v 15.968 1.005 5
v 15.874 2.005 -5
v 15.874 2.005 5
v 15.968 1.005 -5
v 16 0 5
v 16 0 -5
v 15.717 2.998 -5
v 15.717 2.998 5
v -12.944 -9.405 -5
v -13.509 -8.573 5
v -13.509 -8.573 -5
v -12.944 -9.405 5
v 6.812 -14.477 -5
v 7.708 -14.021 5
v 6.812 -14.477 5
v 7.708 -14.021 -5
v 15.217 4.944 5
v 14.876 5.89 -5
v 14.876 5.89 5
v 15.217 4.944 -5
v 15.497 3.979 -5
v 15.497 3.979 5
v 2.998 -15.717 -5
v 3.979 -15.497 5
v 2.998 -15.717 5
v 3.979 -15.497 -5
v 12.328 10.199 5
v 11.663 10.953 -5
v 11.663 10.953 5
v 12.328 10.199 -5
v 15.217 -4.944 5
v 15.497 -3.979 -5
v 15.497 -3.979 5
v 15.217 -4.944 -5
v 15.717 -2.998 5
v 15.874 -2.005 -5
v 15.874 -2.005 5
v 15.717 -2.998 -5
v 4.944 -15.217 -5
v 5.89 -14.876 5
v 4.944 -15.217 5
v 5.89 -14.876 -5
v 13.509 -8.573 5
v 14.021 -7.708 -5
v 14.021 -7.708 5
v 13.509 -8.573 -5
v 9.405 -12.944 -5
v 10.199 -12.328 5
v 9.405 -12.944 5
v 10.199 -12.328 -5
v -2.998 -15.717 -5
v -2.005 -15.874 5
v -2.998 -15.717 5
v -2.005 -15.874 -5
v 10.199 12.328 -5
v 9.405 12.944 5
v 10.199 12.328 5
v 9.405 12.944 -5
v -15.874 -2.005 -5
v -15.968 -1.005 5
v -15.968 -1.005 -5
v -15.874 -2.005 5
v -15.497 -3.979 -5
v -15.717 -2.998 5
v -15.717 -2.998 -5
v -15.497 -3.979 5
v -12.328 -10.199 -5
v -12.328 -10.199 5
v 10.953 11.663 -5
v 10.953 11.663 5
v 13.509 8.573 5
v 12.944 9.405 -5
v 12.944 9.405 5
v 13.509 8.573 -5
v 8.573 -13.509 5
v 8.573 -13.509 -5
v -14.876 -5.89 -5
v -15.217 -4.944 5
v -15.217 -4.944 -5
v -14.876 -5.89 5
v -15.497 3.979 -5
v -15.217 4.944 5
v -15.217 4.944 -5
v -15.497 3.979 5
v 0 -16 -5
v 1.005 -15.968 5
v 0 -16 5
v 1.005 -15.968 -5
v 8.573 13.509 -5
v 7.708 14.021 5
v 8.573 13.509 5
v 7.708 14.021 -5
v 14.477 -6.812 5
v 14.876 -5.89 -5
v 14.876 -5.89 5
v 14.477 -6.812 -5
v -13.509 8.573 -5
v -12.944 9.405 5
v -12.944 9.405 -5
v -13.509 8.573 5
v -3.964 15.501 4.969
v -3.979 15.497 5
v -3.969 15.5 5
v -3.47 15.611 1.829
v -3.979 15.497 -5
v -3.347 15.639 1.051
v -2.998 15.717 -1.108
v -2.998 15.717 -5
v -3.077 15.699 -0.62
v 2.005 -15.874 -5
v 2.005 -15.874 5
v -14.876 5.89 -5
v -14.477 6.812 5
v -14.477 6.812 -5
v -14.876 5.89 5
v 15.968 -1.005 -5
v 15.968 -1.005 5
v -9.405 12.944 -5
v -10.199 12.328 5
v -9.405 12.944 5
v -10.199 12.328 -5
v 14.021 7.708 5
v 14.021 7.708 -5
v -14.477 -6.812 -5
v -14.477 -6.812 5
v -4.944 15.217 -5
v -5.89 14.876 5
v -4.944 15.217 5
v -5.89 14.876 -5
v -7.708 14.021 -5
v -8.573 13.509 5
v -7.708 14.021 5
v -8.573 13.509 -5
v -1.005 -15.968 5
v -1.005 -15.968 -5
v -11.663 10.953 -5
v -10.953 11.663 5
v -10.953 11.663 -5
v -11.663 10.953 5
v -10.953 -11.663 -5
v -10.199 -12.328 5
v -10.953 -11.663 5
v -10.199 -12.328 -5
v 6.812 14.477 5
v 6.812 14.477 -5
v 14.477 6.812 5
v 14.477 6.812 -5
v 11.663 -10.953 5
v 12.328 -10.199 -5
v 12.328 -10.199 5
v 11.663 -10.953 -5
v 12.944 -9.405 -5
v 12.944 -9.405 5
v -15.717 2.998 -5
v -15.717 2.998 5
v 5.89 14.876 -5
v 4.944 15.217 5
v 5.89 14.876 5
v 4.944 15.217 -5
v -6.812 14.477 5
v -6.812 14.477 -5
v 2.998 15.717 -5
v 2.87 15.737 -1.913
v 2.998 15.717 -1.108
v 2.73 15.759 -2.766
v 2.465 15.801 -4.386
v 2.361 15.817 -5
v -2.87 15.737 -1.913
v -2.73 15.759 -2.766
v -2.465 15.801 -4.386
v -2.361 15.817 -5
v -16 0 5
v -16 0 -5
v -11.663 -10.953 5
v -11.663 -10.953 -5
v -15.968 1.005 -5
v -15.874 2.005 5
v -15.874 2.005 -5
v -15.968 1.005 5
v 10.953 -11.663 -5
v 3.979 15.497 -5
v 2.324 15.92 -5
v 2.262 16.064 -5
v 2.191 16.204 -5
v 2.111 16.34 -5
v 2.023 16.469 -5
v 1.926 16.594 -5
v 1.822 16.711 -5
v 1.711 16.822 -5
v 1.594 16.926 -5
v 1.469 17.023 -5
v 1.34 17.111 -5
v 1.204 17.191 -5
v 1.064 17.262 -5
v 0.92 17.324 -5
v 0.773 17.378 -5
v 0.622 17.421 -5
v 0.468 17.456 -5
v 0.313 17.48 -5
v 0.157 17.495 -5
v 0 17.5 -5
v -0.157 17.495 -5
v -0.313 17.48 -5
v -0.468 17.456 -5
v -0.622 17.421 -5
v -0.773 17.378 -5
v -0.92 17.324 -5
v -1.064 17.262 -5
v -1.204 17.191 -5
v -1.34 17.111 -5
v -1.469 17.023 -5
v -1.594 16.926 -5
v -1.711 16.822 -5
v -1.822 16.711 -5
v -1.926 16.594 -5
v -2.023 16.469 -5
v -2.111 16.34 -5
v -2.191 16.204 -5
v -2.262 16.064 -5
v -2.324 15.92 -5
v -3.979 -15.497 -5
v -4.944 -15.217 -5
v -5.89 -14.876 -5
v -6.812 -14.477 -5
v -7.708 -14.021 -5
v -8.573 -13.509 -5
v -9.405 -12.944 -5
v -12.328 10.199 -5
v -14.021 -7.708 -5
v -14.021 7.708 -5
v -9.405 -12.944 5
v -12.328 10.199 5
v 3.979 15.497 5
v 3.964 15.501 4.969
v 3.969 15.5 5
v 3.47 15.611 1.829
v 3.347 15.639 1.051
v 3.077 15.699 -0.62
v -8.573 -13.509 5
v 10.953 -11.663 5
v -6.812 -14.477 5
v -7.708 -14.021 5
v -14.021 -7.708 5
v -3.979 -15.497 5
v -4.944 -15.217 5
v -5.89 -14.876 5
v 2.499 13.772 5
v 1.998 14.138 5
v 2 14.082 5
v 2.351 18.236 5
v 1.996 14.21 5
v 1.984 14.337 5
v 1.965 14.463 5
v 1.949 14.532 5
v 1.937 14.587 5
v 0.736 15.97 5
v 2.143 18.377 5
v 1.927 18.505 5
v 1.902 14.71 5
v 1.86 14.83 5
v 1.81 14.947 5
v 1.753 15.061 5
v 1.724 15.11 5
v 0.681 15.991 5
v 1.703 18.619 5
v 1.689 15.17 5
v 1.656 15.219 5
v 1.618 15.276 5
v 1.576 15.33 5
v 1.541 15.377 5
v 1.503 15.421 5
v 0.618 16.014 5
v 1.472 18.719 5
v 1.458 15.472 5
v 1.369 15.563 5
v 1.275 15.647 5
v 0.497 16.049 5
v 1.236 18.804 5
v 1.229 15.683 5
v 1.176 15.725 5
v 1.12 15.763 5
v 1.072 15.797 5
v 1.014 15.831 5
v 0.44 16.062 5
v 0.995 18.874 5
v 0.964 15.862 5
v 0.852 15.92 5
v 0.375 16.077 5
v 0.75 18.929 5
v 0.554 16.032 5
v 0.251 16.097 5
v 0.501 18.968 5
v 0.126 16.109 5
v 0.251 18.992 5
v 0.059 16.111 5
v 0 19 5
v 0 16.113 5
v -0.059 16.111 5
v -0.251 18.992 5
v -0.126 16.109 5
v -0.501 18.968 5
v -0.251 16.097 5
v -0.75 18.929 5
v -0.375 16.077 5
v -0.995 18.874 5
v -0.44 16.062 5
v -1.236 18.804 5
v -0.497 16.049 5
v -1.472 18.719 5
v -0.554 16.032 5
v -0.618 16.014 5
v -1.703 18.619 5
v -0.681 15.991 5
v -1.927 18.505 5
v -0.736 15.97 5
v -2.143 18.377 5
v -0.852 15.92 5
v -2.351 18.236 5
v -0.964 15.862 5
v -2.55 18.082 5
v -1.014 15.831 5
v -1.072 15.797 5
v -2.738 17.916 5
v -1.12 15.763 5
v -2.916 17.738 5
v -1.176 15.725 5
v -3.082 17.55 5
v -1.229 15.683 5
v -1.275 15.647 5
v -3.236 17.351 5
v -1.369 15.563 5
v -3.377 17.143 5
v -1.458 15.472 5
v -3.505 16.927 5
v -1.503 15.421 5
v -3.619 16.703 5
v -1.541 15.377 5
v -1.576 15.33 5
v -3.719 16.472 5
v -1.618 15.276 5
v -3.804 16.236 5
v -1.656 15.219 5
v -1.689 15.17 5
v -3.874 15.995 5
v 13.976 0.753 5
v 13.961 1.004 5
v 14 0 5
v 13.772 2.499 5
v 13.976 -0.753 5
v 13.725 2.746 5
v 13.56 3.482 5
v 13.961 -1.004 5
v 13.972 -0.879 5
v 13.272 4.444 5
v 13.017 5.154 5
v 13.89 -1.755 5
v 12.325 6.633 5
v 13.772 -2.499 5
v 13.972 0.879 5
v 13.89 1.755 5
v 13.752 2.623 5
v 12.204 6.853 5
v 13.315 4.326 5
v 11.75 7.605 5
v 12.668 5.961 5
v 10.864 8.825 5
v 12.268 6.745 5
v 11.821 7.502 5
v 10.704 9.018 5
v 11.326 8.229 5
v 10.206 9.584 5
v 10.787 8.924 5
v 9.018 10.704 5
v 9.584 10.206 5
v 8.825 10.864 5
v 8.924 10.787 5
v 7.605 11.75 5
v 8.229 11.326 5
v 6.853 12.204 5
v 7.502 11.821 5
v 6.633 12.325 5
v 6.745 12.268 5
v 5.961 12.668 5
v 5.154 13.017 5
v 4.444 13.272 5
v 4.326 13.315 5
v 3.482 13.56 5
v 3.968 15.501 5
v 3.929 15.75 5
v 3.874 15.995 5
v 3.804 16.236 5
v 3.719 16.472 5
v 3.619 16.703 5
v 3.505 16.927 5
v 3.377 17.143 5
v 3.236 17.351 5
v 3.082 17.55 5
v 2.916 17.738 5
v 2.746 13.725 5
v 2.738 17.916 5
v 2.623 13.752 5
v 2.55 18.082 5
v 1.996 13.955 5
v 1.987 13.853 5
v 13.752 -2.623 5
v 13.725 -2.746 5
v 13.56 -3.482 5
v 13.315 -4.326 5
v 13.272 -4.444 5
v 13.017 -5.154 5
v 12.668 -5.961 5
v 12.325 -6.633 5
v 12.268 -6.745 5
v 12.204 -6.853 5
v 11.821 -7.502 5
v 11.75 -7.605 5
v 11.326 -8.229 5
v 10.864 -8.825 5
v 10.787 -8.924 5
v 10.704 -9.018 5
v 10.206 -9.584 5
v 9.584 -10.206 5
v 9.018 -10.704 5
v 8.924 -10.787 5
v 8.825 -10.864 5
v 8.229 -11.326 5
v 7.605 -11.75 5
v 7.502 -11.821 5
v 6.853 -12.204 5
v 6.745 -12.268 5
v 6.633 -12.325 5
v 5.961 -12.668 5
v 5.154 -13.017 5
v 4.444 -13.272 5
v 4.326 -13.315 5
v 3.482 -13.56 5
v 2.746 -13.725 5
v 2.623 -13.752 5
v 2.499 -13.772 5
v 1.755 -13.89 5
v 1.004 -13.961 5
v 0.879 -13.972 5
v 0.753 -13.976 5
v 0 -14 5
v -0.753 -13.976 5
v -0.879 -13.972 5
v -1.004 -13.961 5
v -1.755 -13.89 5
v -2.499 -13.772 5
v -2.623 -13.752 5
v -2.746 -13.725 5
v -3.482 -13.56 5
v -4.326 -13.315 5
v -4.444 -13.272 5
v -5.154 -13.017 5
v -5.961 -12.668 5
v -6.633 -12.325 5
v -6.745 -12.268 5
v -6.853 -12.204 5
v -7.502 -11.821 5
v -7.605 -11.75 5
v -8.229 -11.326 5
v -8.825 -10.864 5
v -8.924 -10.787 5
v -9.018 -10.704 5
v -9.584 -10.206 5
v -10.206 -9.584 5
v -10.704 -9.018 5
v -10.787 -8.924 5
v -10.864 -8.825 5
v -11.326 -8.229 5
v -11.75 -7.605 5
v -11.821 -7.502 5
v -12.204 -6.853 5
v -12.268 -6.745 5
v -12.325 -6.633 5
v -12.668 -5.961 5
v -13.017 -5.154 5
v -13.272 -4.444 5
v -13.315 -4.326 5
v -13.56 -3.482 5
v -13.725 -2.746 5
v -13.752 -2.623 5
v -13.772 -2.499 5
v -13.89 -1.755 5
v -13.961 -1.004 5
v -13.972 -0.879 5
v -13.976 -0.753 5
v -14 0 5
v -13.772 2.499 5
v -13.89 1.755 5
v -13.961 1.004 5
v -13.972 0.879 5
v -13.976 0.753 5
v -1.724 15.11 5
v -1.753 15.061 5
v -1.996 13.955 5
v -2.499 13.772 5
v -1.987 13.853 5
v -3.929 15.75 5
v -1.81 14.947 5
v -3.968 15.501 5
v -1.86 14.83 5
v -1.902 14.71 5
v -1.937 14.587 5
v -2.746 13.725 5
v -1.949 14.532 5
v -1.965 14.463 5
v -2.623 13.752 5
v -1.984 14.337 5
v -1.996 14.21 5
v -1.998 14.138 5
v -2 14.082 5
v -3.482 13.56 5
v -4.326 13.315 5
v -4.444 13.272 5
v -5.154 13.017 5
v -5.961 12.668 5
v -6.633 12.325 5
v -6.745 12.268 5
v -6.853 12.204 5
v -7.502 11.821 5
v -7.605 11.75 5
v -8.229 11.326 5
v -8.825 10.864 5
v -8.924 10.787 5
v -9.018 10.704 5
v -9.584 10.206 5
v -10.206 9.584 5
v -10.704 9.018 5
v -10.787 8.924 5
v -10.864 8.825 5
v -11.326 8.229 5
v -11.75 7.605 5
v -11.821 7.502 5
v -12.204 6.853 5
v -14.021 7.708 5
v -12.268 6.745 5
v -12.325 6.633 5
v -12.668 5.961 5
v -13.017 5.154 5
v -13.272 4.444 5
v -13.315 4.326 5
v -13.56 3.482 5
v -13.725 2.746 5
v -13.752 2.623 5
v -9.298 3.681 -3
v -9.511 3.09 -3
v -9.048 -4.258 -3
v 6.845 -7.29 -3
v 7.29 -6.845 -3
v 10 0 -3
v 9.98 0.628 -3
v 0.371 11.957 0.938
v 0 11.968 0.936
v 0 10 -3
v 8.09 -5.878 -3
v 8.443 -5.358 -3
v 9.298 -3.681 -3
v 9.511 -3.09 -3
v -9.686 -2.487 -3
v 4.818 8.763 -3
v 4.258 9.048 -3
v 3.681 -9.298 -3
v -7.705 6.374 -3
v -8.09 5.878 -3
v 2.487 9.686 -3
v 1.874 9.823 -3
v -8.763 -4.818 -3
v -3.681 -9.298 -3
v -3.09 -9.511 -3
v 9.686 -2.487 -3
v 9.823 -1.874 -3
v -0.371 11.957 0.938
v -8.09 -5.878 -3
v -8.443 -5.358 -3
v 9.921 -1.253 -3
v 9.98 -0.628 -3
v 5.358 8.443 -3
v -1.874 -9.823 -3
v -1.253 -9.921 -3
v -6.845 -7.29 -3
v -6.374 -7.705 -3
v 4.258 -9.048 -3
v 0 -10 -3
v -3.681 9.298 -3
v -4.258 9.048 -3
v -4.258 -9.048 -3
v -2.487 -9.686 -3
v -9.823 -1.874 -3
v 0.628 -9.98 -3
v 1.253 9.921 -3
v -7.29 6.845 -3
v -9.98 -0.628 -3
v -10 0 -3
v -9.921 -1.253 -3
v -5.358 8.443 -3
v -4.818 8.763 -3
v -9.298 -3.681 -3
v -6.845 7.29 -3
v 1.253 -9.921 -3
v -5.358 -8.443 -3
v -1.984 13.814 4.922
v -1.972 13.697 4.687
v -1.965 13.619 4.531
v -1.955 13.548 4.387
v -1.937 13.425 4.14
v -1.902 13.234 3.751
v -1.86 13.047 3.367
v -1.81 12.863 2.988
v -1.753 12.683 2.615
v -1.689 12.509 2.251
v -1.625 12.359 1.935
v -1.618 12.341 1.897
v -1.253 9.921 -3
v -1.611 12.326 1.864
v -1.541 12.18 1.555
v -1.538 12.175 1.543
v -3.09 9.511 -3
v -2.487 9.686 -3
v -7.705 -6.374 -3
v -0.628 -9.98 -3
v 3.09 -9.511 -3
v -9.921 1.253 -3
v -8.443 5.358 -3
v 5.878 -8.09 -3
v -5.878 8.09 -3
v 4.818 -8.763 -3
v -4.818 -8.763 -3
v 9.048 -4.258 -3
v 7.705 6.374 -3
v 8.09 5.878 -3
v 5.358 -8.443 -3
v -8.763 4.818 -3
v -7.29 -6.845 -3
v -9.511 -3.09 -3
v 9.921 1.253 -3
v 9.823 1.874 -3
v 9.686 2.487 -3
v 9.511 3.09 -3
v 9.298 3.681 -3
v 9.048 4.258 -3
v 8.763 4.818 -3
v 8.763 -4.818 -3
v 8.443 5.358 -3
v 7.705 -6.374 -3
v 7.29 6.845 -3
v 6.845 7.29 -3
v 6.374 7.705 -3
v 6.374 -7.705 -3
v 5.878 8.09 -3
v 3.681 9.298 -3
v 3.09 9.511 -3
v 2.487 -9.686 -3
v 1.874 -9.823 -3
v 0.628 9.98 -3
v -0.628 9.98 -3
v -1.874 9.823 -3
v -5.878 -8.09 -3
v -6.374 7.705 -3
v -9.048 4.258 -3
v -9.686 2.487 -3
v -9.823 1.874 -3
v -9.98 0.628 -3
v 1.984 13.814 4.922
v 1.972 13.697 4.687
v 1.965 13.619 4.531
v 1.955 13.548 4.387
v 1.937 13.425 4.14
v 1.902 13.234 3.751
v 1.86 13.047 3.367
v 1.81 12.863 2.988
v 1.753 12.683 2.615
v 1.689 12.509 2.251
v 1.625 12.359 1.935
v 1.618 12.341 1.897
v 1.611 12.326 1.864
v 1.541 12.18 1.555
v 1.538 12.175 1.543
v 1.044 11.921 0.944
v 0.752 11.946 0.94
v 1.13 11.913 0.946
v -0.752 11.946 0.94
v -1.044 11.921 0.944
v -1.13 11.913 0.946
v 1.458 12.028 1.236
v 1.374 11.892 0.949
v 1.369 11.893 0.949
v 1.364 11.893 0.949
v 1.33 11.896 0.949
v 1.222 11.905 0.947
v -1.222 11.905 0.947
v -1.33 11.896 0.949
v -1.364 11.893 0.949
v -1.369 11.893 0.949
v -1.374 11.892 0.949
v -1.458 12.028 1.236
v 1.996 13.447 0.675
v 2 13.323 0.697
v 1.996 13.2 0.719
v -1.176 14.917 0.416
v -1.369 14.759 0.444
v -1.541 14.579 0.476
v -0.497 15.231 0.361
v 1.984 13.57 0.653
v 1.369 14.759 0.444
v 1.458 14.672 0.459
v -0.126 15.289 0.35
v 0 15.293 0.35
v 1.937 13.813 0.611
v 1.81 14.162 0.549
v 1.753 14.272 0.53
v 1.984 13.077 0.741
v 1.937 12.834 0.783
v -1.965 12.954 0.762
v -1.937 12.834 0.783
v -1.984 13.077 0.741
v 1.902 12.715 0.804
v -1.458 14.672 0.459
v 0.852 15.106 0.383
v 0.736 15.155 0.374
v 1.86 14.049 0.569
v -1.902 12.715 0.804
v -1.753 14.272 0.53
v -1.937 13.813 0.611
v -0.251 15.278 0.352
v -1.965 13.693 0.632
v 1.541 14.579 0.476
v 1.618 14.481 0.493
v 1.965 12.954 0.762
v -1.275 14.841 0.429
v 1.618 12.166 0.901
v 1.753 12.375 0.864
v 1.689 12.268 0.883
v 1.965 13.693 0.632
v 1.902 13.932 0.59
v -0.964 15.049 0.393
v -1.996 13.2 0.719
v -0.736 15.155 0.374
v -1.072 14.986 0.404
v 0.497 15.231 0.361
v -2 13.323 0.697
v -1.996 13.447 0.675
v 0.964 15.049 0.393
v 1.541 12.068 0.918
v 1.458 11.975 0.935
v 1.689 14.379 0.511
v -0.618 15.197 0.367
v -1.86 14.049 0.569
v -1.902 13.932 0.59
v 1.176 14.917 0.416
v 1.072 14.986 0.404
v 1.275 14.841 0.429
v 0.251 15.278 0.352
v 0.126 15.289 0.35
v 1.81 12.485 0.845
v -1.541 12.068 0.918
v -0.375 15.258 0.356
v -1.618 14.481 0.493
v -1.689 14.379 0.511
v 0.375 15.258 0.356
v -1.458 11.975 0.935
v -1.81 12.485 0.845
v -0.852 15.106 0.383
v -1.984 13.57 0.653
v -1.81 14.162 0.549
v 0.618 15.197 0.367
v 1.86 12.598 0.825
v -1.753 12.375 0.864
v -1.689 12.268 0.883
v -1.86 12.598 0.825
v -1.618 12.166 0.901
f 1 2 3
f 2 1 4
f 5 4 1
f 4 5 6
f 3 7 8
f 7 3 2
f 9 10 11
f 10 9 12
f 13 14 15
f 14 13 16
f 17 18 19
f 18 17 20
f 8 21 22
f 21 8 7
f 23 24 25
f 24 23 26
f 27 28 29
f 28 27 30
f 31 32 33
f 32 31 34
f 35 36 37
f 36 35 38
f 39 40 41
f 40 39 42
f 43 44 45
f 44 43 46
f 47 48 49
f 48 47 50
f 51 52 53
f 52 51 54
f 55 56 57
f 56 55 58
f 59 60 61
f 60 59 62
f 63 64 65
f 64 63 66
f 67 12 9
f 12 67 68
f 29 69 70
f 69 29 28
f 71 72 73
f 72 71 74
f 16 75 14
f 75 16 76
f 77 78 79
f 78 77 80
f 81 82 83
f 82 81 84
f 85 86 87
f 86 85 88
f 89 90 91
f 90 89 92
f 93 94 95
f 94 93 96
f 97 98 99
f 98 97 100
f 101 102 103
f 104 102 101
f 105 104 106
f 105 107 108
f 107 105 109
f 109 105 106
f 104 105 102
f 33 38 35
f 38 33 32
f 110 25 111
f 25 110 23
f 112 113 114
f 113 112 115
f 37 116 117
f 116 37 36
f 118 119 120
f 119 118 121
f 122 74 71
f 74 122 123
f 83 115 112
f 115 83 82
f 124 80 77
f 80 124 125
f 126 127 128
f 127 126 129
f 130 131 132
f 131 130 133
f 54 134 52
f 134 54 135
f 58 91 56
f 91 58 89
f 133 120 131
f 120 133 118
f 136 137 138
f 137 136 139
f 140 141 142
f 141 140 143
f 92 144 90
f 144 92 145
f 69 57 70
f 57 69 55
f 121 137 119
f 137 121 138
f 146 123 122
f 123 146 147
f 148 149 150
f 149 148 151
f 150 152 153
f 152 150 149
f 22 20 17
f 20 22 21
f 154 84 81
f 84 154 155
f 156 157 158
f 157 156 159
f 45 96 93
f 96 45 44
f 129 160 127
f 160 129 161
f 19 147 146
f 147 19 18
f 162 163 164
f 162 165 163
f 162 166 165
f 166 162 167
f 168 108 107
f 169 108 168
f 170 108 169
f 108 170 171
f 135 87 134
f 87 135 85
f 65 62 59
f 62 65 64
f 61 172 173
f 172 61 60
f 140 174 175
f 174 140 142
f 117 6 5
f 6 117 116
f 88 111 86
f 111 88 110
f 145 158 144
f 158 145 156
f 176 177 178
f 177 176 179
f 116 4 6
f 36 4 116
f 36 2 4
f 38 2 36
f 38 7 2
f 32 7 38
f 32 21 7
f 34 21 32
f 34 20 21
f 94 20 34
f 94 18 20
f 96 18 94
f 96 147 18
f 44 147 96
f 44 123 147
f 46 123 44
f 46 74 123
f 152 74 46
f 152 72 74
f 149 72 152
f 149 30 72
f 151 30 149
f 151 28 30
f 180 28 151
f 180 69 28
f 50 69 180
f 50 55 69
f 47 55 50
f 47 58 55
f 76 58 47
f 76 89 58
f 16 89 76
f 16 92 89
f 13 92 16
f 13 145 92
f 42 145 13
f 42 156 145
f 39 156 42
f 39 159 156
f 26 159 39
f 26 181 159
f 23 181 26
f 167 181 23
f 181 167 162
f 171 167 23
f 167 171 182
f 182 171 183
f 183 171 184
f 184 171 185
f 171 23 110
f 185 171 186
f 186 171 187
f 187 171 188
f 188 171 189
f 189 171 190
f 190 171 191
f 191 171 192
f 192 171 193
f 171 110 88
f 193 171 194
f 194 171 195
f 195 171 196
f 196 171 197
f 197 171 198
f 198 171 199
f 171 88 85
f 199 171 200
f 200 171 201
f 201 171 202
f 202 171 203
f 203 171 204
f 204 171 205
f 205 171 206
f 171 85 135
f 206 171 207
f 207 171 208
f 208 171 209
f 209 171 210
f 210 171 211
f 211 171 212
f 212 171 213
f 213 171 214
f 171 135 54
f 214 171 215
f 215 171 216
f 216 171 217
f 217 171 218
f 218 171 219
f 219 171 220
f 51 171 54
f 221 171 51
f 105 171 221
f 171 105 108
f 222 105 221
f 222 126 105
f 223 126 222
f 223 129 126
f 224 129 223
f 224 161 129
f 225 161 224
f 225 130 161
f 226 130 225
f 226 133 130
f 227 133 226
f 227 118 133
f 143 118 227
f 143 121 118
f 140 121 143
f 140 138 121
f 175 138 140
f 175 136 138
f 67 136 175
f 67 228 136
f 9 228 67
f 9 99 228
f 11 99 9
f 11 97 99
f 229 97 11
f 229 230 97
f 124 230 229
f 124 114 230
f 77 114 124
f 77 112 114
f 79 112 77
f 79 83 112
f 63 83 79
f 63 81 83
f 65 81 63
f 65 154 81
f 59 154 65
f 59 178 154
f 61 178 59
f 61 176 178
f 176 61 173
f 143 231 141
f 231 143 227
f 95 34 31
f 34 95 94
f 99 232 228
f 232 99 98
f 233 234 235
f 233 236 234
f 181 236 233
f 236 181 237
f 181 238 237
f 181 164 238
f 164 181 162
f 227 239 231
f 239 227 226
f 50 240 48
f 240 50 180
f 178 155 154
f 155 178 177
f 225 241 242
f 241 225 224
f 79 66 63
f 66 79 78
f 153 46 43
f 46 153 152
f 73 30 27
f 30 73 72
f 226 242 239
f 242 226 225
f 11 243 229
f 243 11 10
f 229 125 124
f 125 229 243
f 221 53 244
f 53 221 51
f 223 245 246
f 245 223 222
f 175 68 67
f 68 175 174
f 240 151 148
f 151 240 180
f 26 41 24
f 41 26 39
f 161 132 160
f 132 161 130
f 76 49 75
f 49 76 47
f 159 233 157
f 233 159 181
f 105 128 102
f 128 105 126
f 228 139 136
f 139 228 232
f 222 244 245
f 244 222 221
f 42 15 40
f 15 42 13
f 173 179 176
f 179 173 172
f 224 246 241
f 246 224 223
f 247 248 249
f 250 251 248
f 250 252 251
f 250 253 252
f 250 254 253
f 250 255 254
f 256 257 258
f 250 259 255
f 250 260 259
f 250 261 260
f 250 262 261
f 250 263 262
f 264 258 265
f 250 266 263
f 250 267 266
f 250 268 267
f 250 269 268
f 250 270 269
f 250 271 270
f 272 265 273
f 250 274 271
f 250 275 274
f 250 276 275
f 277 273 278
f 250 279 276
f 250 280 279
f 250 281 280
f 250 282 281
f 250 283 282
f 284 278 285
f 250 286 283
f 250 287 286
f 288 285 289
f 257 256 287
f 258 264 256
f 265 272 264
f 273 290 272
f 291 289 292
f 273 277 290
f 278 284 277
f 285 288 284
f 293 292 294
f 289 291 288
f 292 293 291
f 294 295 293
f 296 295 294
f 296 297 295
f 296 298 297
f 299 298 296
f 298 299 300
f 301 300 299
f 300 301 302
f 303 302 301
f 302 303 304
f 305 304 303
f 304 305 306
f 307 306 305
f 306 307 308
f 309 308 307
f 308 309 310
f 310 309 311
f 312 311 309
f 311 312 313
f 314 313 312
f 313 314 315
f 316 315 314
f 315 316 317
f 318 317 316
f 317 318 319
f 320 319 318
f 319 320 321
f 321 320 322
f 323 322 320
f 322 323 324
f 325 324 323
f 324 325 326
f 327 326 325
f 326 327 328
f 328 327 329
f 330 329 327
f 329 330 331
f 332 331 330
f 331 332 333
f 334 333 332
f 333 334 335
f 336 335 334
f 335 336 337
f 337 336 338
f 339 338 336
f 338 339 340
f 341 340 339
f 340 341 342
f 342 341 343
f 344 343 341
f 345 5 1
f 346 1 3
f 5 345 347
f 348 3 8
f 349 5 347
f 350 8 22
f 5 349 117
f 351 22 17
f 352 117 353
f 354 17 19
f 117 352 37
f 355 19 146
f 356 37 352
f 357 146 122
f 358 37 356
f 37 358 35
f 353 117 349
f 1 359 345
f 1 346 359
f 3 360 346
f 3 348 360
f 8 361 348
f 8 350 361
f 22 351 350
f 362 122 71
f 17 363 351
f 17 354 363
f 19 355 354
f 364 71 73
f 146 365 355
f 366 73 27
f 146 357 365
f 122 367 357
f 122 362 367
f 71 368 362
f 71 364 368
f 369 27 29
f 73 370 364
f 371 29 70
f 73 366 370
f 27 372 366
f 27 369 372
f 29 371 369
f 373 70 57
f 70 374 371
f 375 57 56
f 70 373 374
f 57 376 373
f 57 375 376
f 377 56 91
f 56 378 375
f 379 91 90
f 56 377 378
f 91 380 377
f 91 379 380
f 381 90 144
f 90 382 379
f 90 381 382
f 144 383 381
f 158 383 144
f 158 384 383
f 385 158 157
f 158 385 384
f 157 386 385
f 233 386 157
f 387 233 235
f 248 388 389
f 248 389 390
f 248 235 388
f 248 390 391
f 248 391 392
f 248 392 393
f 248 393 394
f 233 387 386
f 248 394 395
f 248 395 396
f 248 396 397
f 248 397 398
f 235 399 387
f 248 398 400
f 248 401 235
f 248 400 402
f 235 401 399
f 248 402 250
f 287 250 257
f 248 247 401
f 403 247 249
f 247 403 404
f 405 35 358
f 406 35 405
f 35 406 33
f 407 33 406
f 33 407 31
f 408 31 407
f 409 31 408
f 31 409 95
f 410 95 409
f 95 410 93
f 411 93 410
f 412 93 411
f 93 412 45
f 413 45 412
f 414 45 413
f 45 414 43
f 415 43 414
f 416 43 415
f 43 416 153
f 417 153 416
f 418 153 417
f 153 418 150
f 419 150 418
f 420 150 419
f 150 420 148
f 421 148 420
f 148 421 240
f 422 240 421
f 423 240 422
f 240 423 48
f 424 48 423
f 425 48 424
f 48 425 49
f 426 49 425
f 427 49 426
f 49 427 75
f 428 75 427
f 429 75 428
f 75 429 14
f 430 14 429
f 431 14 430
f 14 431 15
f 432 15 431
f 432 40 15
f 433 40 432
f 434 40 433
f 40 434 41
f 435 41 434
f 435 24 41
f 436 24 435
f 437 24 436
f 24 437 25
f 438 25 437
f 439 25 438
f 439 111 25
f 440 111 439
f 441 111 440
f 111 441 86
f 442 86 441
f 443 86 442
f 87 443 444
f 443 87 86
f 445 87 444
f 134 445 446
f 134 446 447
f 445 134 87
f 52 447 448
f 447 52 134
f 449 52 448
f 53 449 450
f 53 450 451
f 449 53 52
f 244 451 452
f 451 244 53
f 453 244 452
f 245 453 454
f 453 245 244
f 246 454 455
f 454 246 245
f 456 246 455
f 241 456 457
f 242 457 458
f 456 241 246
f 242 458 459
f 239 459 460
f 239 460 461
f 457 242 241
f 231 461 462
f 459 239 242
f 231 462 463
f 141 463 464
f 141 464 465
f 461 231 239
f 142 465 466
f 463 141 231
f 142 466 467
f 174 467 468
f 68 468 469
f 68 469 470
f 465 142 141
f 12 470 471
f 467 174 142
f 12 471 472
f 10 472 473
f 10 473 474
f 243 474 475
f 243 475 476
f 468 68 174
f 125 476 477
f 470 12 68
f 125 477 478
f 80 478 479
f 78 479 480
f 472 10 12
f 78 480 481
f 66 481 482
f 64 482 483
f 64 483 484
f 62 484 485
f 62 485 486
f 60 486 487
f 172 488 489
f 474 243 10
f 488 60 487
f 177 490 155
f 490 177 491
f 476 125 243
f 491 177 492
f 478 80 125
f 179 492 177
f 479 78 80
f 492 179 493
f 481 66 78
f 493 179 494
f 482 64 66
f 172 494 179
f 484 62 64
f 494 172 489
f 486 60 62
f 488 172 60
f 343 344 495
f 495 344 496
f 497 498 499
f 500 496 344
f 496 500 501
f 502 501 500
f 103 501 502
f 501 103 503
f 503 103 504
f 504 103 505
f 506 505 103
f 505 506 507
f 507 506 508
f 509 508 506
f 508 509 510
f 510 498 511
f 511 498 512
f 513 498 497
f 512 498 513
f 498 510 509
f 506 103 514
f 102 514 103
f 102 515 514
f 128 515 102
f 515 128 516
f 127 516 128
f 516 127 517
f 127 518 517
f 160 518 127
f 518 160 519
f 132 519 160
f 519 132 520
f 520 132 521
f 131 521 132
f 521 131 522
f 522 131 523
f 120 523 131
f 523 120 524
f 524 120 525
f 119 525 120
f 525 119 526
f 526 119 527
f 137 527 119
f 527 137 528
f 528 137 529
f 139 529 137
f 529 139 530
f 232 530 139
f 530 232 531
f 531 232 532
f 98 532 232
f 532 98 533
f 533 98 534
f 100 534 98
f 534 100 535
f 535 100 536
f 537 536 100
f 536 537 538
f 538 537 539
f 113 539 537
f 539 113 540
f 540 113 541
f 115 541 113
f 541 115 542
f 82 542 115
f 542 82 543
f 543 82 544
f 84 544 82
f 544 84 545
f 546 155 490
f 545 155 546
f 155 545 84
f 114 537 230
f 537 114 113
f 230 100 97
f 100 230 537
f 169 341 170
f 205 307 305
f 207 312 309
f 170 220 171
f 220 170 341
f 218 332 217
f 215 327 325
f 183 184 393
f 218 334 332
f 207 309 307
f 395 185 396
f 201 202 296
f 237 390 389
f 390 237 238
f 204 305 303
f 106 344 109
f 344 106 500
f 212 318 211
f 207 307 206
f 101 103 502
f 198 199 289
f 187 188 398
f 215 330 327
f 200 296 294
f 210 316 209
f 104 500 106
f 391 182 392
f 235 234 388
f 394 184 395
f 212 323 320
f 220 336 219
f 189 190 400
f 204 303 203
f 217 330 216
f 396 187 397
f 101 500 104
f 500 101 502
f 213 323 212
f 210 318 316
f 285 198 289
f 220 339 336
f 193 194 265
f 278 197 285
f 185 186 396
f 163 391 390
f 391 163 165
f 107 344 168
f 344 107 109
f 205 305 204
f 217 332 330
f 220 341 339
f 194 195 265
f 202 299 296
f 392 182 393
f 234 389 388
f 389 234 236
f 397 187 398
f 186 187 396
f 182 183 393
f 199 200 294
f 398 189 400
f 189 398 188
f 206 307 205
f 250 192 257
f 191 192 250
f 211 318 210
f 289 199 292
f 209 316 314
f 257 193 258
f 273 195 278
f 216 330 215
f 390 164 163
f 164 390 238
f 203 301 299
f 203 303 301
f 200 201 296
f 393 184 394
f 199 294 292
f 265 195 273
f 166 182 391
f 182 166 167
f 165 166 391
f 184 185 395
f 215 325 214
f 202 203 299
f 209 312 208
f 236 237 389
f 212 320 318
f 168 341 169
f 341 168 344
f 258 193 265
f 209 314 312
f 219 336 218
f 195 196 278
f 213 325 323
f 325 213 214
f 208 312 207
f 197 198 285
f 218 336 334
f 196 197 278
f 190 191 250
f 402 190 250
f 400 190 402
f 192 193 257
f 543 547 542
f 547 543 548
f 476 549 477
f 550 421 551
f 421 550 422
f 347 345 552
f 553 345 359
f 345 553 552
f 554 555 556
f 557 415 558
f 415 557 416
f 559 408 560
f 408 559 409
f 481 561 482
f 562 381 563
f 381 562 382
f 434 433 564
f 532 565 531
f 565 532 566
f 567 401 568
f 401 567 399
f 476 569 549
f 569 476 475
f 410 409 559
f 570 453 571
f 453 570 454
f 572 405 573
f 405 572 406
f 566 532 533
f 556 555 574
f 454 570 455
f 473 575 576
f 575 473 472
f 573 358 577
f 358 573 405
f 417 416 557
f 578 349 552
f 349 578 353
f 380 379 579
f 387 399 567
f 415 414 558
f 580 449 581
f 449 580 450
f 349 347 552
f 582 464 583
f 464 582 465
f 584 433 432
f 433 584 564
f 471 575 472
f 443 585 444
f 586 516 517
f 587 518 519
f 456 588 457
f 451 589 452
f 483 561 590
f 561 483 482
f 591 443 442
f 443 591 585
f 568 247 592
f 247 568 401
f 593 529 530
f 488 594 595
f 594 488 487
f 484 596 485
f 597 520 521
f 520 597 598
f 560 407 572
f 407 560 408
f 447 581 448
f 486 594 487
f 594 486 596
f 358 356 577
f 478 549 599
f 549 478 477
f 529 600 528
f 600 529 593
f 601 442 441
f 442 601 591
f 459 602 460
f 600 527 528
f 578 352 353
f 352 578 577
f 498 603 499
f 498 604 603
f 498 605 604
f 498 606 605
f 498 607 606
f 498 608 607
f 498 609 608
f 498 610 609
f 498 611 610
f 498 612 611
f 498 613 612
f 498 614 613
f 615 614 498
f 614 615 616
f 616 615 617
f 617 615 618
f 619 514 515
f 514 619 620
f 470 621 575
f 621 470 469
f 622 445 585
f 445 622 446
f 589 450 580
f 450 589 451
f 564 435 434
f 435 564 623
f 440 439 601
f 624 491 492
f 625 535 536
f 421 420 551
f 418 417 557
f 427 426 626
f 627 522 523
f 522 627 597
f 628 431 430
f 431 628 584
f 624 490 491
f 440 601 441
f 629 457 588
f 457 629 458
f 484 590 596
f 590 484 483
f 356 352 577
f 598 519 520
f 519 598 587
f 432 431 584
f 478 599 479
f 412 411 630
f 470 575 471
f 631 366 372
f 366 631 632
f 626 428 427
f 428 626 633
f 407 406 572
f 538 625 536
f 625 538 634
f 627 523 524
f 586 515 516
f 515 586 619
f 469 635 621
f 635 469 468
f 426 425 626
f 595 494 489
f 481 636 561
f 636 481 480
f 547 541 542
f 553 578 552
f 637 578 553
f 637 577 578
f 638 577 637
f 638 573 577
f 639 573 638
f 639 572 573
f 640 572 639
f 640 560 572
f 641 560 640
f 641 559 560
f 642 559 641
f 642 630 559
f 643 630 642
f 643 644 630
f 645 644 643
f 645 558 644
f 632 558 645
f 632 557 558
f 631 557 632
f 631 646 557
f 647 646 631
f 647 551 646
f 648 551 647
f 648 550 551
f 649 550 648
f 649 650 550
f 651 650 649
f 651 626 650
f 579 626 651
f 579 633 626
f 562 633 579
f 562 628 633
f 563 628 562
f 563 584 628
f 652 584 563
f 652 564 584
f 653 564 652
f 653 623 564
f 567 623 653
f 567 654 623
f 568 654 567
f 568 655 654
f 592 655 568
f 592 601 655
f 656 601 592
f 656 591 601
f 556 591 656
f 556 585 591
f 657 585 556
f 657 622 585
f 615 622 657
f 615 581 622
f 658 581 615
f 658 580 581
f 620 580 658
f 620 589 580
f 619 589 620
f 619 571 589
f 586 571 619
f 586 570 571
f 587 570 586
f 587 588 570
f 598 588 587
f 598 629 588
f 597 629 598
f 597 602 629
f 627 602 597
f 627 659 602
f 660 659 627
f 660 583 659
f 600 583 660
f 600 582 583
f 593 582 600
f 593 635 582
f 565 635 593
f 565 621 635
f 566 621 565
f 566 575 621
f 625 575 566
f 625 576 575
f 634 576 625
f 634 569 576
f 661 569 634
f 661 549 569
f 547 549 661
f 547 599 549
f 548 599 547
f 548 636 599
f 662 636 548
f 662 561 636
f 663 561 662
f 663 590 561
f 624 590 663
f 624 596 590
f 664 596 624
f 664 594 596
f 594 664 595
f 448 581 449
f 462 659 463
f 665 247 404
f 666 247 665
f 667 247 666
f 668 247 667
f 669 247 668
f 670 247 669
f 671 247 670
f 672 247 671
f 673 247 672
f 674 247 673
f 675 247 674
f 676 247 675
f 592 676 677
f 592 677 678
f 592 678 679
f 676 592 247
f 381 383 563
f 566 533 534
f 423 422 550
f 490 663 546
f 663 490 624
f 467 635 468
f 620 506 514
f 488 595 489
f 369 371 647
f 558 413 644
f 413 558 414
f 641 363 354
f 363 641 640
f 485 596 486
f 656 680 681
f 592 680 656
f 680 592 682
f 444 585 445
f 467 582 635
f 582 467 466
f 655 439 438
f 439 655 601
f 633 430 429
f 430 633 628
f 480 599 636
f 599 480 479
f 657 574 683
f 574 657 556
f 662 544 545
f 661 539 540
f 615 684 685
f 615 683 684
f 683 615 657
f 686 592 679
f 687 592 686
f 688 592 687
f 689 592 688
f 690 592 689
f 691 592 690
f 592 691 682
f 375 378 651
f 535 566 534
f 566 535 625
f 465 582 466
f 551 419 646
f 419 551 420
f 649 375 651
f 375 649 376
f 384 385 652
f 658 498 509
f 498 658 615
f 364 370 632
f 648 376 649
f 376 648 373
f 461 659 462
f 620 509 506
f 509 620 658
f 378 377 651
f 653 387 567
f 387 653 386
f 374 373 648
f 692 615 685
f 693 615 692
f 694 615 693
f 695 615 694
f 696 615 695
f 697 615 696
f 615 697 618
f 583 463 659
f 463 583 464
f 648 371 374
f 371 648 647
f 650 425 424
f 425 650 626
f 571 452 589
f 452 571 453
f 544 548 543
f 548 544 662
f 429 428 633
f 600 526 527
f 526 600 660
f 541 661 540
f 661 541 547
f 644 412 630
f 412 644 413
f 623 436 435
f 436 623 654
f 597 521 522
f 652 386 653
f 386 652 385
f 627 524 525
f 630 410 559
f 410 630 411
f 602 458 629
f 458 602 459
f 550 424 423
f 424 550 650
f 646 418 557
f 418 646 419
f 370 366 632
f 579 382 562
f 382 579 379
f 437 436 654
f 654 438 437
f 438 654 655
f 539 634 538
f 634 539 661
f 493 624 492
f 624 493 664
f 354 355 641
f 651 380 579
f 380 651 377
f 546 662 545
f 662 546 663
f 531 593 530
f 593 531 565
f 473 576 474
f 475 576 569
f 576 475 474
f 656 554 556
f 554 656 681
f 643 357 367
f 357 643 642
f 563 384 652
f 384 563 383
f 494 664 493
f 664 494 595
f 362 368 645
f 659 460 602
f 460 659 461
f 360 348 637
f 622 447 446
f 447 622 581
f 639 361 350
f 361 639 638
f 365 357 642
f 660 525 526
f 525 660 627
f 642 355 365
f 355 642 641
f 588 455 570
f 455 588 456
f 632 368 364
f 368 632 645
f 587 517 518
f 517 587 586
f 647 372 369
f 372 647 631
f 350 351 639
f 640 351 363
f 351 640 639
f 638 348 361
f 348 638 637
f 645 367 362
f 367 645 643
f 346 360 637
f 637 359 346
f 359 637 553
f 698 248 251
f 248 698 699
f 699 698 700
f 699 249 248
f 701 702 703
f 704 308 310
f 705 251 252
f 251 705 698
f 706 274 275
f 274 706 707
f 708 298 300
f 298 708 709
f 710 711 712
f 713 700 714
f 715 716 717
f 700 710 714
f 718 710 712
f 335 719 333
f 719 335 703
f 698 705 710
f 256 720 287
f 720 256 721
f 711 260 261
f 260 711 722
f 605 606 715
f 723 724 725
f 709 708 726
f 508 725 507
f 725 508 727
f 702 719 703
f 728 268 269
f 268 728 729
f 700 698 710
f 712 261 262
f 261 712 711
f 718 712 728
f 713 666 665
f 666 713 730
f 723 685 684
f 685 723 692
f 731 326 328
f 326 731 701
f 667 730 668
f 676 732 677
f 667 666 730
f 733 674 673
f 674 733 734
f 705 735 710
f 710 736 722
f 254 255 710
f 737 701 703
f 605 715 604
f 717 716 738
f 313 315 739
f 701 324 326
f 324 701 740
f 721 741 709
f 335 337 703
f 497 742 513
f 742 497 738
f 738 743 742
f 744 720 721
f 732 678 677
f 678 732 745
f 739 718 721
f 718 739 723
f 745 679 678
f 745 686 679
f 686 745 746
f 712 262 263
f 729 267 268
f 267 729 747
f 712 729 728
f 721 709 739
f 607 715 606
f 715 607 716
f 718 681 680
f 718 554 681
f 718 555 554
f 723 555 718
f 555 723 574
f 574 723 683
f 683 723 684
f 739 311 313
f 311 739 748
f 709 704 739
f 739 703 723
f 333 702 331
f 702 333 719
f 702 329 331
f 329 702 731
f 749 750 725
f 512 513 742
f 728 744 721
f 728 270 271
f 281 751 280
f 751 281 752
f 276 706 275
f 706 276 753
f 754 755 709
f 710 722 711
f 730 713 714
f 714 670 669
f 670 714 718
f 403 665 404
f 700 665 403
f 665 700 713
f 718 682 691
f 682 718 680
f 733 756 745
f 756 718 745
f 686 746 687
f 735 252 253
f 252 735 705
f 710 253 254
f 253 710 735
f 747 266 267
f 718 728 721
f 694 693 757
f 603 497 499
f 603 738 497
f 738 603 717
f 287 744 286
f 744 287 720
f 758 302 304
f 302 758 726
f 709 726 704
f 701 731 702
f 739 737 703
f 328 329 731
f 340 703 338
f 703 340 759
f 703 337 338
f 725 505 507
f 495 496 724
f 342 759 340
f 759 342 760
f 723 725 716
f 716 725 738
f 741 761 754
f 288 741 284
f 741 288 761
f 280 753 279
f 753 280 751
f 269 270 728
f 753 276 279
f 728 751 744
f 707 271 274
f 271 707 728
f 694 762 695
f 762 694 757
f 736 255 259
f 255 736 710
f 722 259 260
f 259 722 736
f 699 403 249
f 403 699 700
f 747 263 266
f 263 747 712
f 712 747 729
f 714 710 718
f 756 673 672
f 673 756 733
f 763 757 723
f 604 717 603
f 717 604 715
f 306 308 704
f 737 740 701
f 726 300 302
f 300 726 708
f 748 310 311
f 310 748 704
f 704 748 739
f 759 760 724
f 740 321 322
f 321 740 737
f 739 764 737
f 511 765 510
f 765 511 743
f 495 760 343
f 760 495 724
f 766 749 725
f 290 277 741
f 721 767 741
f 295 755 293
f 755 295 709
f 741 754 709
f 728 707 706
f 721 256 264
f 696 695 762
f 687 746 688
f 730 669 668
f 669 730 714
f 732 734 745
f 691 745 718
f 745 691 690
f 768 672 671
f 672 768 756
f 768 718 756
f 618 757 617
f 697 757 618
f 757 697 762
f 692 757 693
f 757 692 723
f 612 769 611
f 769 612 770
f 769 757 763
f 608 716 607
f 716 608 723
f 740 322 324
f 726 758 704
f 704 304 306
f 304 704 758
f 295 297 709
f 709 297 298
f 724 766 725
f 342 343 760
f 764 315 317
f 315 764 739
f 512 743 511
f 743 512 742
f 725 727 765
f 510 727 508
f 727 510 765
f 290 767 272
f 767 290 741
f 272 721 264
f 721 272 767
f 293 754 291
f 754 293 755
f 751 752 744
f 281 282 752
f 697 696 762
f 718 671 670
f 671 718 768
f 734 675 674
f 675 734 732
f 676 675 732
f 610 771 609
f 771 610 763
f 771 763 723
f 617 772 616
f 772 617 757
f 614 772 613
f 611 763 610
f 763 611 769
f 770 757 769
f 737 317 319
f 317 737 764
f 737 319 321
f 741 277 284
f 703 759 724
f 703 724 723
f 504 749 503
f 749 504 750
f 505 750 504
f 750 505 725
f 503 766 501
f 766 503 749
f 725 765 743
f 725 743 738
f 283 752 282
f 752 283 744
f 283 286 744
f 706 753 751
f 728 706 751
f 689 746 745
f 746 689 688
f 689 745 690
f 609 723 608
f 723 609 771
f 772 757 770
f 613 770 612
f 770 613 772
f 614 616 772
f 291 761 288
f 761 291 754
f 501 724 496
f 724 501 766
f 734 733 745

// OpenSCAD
thick  = 2;
height = 10;

radiusDown = 20.0 /2;
radiusUp   = 30.0 / 2; 

jetDown = 5.0 /2;
jetUp = 8.0 /2;

$fn = 100;

module tray()
{
    difference()
    {
        difference()
        { 
         union()
         {   
          cylinder(h= height, r=radiusUp + (thick/2), center=true);
          translate([0, radiusUp, 0]) cylinder(h= height, r1= jetDown, r2 = jetUp, center=true);   
         }     
         translate([0,0, thick]) #cylinder(h=height, r1=radiusDown, r2=radiusUp, center=true);
         
         // Jet
         rotate([-10, 0, 0])
         translate([0, radiusUp - thick, height - thick]) 
          #cylinder(h= height, r= jetUp - thick, center=true);
        }
    }
}

tray();
